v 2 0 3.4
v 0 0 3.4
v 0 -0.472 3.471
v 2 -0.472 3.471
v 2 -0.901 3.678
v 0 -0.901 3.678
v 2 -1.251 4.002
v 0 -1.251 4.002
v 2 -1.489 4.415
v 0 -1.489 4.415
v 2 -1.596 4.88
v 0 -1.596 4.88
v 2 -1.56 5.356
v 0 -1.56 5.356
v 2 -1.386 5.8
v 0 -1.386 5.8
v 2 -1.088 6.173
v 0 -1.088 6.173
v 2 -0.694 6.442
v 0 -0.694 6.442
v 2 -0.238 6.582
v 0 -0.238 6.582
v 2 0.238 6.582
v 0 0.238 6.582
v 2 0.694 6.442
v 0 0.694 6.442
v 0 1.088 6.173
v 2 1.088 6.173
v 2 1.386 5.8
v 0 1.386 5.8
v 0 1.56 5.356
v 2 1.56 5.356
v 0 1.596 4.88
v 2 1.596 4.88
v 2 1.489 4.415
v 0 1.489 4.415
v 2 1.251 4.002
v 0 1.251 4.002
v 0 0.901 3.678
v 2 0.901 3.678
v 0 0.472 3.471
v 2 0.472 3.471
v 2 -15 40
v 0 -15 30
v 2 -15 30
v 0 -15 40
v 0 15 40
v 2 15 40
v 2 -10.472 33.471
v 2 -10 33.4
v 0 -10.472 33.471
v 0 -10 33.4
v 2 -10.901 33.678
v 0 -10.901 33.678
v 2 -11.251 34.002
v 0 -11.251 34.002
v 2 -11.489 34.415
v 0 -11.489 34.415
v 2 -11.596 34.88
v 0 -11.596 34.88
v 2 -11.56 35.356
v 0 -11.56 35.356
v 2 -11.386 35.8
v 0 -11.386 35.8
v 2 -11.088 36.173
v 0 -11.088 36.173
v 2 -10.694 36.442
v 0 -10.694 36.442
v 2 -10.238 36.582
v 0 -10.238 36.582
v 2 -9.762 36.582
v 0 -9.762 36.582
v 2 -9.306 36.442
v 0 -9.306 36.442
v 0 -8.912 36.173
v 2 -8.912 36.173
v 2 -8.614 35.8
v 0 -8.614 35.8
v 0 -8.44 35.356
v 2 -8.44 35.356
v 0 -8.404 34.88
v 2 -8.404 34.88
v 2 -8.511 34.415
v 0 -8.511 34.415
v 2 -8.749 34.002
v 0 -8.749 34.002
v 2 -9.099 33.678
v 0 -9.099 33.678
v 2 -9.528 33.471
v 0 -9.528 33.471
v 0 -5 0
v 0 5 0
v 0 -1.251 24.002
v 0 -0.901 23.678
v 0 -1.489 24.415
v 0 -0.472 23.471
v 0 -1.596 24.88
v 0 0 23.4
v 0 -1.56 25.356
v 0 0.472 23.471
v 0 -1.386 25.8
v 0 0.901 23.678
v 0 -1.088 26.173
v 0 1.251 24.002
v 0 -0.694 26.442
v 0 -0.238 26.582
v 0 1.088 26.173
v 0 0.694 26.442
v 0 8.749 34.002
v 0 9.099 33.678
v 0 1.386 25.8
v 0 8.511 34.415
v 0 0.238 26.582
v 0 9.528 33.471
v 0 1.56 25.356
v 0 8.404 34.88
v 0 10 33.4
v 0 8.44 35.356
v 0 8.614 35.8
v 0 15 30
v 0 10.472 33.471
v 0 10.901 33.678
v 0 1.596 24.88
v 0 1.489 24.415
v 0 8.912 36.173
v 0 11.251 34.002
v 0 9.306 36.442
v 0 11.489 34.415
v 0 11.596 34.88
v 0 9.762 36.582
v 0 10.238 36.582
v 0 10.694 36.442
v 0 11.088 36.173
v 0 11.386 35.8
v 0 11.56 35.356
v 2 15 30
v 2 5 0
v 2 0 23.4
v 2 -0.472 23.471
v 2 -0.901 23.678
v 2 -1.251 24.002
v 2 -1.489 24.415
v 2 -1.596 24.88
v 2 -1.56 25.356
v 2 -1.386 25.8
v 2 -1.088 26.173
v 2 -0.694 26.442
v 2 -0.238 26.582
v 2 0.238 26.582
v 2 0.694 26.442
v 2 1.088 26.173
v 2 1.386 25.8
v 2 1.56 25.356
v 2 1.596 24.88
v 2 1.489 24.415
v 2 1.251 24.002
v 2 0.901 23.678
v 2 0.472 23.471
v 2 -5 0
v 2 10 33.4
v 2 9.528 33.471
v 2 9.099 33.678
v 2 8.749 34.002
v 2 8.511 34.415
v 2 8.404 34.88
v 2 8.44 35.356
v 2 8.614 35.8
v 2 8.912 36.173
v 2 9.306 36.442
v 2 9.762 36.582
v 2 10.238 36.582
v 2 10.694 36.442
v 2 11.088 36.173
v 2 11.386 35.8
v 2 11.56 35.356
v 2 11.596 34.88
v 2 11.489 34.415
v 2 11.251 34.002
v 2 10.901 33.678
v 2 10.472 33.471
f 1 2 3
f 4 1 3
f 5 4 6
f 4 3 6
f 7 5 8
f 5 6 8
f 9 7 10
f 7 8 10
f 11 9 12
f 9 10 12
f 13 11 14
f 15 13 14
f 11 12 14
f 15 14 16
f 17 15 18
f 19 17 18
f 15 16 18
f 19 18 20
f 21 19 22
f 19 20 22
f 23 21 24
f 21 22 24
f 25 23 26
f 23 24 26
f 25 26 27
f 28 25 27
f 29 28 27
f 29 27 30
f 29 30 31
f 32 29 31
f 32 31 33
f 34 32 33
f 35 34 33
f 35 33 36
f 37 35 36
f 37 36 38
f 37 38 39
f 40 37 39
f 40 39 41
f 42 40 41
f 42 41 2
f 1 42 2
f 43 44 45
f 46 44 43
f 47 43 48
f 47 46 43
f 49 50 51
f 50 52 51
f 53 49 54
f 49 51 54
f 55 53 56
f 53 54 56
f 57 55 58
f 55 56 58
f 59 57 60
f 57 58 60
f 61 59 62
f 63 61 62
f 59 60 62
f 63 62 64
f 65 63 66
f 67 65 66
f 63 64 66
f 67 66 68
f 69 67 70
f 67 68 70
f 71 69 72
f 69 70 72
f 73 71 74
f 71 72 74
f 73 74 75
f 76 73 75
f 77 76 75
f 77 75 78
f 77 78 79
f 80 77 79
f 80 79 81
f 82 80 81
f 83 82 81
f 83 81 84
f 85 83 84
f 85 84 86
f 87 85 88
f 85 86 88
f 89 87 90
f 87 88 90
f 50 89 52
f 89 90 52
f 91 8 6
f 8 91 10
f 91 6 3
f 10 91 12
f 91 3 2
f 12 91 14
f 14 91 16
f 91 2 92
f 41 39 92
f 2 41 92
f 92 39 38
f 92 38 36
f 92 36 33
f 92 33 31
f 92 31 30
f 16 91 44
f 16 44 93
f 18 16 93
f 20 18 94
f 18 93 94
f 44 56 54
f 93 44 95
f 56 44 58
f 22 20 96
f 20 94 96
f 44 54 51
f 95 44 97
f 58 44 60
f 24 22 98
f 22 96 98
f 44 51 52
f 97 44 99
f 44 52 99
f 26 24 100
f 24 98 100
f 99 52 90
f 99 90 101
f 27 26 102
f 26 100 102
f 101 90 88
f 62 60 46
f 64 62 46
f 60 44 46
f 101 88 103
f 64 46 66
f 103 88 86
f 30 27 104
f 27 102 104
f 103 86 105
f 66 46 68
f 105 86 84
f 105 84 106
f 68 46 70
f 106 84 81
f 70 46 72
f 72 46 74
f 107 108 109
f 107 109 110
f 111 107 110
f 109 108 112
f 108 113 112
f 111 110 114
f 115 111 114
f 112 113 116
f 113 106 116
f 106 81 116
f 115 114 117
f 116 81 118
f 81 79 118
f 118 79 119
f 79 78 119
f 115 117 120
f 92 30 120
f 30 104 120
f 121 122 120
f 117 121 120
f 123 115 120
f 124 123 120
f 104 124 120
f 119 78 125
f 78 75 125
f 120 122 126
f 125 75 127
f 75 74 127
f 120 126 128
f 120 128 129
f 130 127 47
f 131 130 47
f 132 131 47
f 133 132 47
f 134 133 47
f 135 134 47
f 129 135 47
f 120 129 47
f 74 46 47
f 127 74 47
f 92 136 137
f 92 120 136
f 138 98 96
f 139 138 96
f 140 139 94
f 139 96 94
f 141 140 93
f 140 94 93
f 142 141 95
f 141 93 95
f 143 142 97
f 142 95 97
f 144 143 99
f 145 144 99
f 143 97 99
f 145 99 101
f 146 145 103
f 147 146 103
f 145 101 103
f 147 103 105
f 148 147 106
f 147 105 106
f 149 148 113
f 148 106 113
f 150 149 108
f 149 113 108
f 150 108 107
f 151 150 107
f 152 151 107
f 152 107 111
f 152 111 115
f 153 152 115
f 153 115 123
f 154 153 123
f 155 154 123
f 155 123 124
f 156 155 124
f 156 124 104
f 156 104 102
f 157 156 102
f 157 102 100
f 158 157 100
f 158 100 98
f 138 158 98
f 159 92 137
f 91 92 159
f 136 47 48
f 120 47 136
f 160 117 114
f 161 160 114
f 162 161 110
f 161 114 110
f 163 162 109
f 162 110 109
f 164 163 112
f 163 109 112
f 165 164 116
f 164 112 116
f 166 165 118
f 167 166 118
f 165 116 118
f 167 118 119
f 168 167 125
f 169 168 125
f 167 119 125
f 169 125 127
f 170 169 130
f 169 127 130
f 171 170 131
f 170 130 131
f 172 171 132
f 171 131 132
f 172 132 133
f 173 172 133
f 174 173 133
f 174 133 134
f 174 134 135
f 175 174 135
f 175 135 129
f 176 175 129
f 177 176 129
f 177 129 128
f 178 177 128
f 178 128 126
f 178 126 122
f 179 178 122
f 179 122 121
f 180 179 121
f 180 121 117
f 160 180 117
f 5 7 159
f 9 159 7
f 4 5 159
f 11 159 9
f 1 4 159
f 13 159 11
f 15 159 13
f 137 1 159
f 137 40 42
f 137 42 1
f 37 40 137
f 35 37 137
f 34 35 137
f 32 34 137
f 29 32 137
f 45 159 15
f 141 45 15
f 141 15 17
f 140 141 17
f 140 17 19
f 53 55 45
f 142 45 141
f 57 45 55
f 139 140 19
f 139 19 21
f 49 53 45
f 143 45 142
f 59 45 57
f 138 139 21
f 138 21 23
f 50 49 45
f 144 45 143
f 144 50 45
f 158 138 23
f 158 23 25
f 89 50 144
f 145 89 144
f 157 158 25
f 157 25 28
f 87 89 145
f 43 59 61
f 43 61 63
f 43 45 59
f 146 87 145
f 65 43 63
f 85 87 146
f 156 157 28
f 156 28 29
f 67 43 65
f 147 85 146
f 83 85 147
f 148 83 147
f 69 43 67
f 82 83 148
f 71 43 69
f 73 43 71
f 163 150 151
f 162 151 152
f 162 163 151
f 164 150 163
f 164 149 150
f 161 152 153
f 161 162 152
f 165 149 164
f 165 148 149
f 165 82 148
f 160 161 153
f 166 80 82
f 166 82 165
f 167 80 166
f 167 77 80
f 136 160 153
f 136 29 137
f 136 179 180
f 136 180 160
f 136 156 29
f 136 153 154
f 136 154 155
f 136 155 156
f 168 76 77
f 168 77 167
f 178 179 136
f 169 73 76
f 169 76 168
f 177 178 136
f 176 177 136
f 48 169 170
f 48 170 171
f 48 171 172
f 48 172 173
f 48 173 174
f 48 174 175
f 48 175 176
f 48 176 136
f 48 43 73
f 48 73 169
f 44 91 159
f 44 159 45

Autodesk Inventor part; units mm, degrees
ref_plane "YZ Plane" through (0, 0, 0) normal (1, 0, 0) x (0, 1, 0)
ref_plane "XZ Plane" through (0, 0, 0) normal (0, 1, 0) x (-1, 0, 0)
ref_plane "XY Plane" through (0, 0, 0) normal (0, 0, 1) x (1, 0, 0)
sketch "スケッチ1" plane through (0, 0, 0) normal (1, 0, 0) x (0, 1, 0)
  line L0 (-5, 30) -> (5, 30)
  line L1 (5, 30) -> (5, 0)
  line L2 (5, 0) -> (-5, 0)
  line L3 (-5, 0) -> (-5, 30)
  line L4 (-15, 40) -> (15, 40)
  line L5 (15, 40) -> (15, 30)
  line L6 (15, 30) -> (-15, 30)
  line L7 (-15, 30) -> (-15, 40)
  line L8 (15, 30) -> (5, 0)
  line L9 (-5, 0) -> (-15, 30)
  point P0 (0, 0)
  point P1 (0, 0)
  point P2 (0, 30)
  dimension "d0" = 10
  dimension "d1" = 30
  dimension "d2" = 30
  dimension "d3" = 10
extrude "押し出し1" add sketch "スケッチ1" along normal blind 2
sketch "スケッチ2" plane through (2, 0, 0) normal (1, 0, 0) x (0, 0, -1)
  line L0 (0, -5) -> (0, 5) projected
  line L1 (-30, 15) -> (-40, 15) projected
  line L2 (-40, -15) -> (-30, -15) projected
  point P0 (0, 0)
  point P1 (-35, 10)
  point P2 (-35, -10)
  point P3 (-25, 0)
  point P4 (-5, 0)
  point P5 (0, 0)
  point P6 (-35, 15)
  dimension "d6" = 5
  dimension "d7" = 20
  dimension "d8" = 5
  dimension "d9" = 5
hole "穴1" at (2, 10, 35) at (2, -10, 35) at (2, 0, 25) at (2, 0, 5) direction (-1, 0, 0) diameter 3.2 end through all
properties part number "FrameJointT1515" material "アルミニウム 6061"
